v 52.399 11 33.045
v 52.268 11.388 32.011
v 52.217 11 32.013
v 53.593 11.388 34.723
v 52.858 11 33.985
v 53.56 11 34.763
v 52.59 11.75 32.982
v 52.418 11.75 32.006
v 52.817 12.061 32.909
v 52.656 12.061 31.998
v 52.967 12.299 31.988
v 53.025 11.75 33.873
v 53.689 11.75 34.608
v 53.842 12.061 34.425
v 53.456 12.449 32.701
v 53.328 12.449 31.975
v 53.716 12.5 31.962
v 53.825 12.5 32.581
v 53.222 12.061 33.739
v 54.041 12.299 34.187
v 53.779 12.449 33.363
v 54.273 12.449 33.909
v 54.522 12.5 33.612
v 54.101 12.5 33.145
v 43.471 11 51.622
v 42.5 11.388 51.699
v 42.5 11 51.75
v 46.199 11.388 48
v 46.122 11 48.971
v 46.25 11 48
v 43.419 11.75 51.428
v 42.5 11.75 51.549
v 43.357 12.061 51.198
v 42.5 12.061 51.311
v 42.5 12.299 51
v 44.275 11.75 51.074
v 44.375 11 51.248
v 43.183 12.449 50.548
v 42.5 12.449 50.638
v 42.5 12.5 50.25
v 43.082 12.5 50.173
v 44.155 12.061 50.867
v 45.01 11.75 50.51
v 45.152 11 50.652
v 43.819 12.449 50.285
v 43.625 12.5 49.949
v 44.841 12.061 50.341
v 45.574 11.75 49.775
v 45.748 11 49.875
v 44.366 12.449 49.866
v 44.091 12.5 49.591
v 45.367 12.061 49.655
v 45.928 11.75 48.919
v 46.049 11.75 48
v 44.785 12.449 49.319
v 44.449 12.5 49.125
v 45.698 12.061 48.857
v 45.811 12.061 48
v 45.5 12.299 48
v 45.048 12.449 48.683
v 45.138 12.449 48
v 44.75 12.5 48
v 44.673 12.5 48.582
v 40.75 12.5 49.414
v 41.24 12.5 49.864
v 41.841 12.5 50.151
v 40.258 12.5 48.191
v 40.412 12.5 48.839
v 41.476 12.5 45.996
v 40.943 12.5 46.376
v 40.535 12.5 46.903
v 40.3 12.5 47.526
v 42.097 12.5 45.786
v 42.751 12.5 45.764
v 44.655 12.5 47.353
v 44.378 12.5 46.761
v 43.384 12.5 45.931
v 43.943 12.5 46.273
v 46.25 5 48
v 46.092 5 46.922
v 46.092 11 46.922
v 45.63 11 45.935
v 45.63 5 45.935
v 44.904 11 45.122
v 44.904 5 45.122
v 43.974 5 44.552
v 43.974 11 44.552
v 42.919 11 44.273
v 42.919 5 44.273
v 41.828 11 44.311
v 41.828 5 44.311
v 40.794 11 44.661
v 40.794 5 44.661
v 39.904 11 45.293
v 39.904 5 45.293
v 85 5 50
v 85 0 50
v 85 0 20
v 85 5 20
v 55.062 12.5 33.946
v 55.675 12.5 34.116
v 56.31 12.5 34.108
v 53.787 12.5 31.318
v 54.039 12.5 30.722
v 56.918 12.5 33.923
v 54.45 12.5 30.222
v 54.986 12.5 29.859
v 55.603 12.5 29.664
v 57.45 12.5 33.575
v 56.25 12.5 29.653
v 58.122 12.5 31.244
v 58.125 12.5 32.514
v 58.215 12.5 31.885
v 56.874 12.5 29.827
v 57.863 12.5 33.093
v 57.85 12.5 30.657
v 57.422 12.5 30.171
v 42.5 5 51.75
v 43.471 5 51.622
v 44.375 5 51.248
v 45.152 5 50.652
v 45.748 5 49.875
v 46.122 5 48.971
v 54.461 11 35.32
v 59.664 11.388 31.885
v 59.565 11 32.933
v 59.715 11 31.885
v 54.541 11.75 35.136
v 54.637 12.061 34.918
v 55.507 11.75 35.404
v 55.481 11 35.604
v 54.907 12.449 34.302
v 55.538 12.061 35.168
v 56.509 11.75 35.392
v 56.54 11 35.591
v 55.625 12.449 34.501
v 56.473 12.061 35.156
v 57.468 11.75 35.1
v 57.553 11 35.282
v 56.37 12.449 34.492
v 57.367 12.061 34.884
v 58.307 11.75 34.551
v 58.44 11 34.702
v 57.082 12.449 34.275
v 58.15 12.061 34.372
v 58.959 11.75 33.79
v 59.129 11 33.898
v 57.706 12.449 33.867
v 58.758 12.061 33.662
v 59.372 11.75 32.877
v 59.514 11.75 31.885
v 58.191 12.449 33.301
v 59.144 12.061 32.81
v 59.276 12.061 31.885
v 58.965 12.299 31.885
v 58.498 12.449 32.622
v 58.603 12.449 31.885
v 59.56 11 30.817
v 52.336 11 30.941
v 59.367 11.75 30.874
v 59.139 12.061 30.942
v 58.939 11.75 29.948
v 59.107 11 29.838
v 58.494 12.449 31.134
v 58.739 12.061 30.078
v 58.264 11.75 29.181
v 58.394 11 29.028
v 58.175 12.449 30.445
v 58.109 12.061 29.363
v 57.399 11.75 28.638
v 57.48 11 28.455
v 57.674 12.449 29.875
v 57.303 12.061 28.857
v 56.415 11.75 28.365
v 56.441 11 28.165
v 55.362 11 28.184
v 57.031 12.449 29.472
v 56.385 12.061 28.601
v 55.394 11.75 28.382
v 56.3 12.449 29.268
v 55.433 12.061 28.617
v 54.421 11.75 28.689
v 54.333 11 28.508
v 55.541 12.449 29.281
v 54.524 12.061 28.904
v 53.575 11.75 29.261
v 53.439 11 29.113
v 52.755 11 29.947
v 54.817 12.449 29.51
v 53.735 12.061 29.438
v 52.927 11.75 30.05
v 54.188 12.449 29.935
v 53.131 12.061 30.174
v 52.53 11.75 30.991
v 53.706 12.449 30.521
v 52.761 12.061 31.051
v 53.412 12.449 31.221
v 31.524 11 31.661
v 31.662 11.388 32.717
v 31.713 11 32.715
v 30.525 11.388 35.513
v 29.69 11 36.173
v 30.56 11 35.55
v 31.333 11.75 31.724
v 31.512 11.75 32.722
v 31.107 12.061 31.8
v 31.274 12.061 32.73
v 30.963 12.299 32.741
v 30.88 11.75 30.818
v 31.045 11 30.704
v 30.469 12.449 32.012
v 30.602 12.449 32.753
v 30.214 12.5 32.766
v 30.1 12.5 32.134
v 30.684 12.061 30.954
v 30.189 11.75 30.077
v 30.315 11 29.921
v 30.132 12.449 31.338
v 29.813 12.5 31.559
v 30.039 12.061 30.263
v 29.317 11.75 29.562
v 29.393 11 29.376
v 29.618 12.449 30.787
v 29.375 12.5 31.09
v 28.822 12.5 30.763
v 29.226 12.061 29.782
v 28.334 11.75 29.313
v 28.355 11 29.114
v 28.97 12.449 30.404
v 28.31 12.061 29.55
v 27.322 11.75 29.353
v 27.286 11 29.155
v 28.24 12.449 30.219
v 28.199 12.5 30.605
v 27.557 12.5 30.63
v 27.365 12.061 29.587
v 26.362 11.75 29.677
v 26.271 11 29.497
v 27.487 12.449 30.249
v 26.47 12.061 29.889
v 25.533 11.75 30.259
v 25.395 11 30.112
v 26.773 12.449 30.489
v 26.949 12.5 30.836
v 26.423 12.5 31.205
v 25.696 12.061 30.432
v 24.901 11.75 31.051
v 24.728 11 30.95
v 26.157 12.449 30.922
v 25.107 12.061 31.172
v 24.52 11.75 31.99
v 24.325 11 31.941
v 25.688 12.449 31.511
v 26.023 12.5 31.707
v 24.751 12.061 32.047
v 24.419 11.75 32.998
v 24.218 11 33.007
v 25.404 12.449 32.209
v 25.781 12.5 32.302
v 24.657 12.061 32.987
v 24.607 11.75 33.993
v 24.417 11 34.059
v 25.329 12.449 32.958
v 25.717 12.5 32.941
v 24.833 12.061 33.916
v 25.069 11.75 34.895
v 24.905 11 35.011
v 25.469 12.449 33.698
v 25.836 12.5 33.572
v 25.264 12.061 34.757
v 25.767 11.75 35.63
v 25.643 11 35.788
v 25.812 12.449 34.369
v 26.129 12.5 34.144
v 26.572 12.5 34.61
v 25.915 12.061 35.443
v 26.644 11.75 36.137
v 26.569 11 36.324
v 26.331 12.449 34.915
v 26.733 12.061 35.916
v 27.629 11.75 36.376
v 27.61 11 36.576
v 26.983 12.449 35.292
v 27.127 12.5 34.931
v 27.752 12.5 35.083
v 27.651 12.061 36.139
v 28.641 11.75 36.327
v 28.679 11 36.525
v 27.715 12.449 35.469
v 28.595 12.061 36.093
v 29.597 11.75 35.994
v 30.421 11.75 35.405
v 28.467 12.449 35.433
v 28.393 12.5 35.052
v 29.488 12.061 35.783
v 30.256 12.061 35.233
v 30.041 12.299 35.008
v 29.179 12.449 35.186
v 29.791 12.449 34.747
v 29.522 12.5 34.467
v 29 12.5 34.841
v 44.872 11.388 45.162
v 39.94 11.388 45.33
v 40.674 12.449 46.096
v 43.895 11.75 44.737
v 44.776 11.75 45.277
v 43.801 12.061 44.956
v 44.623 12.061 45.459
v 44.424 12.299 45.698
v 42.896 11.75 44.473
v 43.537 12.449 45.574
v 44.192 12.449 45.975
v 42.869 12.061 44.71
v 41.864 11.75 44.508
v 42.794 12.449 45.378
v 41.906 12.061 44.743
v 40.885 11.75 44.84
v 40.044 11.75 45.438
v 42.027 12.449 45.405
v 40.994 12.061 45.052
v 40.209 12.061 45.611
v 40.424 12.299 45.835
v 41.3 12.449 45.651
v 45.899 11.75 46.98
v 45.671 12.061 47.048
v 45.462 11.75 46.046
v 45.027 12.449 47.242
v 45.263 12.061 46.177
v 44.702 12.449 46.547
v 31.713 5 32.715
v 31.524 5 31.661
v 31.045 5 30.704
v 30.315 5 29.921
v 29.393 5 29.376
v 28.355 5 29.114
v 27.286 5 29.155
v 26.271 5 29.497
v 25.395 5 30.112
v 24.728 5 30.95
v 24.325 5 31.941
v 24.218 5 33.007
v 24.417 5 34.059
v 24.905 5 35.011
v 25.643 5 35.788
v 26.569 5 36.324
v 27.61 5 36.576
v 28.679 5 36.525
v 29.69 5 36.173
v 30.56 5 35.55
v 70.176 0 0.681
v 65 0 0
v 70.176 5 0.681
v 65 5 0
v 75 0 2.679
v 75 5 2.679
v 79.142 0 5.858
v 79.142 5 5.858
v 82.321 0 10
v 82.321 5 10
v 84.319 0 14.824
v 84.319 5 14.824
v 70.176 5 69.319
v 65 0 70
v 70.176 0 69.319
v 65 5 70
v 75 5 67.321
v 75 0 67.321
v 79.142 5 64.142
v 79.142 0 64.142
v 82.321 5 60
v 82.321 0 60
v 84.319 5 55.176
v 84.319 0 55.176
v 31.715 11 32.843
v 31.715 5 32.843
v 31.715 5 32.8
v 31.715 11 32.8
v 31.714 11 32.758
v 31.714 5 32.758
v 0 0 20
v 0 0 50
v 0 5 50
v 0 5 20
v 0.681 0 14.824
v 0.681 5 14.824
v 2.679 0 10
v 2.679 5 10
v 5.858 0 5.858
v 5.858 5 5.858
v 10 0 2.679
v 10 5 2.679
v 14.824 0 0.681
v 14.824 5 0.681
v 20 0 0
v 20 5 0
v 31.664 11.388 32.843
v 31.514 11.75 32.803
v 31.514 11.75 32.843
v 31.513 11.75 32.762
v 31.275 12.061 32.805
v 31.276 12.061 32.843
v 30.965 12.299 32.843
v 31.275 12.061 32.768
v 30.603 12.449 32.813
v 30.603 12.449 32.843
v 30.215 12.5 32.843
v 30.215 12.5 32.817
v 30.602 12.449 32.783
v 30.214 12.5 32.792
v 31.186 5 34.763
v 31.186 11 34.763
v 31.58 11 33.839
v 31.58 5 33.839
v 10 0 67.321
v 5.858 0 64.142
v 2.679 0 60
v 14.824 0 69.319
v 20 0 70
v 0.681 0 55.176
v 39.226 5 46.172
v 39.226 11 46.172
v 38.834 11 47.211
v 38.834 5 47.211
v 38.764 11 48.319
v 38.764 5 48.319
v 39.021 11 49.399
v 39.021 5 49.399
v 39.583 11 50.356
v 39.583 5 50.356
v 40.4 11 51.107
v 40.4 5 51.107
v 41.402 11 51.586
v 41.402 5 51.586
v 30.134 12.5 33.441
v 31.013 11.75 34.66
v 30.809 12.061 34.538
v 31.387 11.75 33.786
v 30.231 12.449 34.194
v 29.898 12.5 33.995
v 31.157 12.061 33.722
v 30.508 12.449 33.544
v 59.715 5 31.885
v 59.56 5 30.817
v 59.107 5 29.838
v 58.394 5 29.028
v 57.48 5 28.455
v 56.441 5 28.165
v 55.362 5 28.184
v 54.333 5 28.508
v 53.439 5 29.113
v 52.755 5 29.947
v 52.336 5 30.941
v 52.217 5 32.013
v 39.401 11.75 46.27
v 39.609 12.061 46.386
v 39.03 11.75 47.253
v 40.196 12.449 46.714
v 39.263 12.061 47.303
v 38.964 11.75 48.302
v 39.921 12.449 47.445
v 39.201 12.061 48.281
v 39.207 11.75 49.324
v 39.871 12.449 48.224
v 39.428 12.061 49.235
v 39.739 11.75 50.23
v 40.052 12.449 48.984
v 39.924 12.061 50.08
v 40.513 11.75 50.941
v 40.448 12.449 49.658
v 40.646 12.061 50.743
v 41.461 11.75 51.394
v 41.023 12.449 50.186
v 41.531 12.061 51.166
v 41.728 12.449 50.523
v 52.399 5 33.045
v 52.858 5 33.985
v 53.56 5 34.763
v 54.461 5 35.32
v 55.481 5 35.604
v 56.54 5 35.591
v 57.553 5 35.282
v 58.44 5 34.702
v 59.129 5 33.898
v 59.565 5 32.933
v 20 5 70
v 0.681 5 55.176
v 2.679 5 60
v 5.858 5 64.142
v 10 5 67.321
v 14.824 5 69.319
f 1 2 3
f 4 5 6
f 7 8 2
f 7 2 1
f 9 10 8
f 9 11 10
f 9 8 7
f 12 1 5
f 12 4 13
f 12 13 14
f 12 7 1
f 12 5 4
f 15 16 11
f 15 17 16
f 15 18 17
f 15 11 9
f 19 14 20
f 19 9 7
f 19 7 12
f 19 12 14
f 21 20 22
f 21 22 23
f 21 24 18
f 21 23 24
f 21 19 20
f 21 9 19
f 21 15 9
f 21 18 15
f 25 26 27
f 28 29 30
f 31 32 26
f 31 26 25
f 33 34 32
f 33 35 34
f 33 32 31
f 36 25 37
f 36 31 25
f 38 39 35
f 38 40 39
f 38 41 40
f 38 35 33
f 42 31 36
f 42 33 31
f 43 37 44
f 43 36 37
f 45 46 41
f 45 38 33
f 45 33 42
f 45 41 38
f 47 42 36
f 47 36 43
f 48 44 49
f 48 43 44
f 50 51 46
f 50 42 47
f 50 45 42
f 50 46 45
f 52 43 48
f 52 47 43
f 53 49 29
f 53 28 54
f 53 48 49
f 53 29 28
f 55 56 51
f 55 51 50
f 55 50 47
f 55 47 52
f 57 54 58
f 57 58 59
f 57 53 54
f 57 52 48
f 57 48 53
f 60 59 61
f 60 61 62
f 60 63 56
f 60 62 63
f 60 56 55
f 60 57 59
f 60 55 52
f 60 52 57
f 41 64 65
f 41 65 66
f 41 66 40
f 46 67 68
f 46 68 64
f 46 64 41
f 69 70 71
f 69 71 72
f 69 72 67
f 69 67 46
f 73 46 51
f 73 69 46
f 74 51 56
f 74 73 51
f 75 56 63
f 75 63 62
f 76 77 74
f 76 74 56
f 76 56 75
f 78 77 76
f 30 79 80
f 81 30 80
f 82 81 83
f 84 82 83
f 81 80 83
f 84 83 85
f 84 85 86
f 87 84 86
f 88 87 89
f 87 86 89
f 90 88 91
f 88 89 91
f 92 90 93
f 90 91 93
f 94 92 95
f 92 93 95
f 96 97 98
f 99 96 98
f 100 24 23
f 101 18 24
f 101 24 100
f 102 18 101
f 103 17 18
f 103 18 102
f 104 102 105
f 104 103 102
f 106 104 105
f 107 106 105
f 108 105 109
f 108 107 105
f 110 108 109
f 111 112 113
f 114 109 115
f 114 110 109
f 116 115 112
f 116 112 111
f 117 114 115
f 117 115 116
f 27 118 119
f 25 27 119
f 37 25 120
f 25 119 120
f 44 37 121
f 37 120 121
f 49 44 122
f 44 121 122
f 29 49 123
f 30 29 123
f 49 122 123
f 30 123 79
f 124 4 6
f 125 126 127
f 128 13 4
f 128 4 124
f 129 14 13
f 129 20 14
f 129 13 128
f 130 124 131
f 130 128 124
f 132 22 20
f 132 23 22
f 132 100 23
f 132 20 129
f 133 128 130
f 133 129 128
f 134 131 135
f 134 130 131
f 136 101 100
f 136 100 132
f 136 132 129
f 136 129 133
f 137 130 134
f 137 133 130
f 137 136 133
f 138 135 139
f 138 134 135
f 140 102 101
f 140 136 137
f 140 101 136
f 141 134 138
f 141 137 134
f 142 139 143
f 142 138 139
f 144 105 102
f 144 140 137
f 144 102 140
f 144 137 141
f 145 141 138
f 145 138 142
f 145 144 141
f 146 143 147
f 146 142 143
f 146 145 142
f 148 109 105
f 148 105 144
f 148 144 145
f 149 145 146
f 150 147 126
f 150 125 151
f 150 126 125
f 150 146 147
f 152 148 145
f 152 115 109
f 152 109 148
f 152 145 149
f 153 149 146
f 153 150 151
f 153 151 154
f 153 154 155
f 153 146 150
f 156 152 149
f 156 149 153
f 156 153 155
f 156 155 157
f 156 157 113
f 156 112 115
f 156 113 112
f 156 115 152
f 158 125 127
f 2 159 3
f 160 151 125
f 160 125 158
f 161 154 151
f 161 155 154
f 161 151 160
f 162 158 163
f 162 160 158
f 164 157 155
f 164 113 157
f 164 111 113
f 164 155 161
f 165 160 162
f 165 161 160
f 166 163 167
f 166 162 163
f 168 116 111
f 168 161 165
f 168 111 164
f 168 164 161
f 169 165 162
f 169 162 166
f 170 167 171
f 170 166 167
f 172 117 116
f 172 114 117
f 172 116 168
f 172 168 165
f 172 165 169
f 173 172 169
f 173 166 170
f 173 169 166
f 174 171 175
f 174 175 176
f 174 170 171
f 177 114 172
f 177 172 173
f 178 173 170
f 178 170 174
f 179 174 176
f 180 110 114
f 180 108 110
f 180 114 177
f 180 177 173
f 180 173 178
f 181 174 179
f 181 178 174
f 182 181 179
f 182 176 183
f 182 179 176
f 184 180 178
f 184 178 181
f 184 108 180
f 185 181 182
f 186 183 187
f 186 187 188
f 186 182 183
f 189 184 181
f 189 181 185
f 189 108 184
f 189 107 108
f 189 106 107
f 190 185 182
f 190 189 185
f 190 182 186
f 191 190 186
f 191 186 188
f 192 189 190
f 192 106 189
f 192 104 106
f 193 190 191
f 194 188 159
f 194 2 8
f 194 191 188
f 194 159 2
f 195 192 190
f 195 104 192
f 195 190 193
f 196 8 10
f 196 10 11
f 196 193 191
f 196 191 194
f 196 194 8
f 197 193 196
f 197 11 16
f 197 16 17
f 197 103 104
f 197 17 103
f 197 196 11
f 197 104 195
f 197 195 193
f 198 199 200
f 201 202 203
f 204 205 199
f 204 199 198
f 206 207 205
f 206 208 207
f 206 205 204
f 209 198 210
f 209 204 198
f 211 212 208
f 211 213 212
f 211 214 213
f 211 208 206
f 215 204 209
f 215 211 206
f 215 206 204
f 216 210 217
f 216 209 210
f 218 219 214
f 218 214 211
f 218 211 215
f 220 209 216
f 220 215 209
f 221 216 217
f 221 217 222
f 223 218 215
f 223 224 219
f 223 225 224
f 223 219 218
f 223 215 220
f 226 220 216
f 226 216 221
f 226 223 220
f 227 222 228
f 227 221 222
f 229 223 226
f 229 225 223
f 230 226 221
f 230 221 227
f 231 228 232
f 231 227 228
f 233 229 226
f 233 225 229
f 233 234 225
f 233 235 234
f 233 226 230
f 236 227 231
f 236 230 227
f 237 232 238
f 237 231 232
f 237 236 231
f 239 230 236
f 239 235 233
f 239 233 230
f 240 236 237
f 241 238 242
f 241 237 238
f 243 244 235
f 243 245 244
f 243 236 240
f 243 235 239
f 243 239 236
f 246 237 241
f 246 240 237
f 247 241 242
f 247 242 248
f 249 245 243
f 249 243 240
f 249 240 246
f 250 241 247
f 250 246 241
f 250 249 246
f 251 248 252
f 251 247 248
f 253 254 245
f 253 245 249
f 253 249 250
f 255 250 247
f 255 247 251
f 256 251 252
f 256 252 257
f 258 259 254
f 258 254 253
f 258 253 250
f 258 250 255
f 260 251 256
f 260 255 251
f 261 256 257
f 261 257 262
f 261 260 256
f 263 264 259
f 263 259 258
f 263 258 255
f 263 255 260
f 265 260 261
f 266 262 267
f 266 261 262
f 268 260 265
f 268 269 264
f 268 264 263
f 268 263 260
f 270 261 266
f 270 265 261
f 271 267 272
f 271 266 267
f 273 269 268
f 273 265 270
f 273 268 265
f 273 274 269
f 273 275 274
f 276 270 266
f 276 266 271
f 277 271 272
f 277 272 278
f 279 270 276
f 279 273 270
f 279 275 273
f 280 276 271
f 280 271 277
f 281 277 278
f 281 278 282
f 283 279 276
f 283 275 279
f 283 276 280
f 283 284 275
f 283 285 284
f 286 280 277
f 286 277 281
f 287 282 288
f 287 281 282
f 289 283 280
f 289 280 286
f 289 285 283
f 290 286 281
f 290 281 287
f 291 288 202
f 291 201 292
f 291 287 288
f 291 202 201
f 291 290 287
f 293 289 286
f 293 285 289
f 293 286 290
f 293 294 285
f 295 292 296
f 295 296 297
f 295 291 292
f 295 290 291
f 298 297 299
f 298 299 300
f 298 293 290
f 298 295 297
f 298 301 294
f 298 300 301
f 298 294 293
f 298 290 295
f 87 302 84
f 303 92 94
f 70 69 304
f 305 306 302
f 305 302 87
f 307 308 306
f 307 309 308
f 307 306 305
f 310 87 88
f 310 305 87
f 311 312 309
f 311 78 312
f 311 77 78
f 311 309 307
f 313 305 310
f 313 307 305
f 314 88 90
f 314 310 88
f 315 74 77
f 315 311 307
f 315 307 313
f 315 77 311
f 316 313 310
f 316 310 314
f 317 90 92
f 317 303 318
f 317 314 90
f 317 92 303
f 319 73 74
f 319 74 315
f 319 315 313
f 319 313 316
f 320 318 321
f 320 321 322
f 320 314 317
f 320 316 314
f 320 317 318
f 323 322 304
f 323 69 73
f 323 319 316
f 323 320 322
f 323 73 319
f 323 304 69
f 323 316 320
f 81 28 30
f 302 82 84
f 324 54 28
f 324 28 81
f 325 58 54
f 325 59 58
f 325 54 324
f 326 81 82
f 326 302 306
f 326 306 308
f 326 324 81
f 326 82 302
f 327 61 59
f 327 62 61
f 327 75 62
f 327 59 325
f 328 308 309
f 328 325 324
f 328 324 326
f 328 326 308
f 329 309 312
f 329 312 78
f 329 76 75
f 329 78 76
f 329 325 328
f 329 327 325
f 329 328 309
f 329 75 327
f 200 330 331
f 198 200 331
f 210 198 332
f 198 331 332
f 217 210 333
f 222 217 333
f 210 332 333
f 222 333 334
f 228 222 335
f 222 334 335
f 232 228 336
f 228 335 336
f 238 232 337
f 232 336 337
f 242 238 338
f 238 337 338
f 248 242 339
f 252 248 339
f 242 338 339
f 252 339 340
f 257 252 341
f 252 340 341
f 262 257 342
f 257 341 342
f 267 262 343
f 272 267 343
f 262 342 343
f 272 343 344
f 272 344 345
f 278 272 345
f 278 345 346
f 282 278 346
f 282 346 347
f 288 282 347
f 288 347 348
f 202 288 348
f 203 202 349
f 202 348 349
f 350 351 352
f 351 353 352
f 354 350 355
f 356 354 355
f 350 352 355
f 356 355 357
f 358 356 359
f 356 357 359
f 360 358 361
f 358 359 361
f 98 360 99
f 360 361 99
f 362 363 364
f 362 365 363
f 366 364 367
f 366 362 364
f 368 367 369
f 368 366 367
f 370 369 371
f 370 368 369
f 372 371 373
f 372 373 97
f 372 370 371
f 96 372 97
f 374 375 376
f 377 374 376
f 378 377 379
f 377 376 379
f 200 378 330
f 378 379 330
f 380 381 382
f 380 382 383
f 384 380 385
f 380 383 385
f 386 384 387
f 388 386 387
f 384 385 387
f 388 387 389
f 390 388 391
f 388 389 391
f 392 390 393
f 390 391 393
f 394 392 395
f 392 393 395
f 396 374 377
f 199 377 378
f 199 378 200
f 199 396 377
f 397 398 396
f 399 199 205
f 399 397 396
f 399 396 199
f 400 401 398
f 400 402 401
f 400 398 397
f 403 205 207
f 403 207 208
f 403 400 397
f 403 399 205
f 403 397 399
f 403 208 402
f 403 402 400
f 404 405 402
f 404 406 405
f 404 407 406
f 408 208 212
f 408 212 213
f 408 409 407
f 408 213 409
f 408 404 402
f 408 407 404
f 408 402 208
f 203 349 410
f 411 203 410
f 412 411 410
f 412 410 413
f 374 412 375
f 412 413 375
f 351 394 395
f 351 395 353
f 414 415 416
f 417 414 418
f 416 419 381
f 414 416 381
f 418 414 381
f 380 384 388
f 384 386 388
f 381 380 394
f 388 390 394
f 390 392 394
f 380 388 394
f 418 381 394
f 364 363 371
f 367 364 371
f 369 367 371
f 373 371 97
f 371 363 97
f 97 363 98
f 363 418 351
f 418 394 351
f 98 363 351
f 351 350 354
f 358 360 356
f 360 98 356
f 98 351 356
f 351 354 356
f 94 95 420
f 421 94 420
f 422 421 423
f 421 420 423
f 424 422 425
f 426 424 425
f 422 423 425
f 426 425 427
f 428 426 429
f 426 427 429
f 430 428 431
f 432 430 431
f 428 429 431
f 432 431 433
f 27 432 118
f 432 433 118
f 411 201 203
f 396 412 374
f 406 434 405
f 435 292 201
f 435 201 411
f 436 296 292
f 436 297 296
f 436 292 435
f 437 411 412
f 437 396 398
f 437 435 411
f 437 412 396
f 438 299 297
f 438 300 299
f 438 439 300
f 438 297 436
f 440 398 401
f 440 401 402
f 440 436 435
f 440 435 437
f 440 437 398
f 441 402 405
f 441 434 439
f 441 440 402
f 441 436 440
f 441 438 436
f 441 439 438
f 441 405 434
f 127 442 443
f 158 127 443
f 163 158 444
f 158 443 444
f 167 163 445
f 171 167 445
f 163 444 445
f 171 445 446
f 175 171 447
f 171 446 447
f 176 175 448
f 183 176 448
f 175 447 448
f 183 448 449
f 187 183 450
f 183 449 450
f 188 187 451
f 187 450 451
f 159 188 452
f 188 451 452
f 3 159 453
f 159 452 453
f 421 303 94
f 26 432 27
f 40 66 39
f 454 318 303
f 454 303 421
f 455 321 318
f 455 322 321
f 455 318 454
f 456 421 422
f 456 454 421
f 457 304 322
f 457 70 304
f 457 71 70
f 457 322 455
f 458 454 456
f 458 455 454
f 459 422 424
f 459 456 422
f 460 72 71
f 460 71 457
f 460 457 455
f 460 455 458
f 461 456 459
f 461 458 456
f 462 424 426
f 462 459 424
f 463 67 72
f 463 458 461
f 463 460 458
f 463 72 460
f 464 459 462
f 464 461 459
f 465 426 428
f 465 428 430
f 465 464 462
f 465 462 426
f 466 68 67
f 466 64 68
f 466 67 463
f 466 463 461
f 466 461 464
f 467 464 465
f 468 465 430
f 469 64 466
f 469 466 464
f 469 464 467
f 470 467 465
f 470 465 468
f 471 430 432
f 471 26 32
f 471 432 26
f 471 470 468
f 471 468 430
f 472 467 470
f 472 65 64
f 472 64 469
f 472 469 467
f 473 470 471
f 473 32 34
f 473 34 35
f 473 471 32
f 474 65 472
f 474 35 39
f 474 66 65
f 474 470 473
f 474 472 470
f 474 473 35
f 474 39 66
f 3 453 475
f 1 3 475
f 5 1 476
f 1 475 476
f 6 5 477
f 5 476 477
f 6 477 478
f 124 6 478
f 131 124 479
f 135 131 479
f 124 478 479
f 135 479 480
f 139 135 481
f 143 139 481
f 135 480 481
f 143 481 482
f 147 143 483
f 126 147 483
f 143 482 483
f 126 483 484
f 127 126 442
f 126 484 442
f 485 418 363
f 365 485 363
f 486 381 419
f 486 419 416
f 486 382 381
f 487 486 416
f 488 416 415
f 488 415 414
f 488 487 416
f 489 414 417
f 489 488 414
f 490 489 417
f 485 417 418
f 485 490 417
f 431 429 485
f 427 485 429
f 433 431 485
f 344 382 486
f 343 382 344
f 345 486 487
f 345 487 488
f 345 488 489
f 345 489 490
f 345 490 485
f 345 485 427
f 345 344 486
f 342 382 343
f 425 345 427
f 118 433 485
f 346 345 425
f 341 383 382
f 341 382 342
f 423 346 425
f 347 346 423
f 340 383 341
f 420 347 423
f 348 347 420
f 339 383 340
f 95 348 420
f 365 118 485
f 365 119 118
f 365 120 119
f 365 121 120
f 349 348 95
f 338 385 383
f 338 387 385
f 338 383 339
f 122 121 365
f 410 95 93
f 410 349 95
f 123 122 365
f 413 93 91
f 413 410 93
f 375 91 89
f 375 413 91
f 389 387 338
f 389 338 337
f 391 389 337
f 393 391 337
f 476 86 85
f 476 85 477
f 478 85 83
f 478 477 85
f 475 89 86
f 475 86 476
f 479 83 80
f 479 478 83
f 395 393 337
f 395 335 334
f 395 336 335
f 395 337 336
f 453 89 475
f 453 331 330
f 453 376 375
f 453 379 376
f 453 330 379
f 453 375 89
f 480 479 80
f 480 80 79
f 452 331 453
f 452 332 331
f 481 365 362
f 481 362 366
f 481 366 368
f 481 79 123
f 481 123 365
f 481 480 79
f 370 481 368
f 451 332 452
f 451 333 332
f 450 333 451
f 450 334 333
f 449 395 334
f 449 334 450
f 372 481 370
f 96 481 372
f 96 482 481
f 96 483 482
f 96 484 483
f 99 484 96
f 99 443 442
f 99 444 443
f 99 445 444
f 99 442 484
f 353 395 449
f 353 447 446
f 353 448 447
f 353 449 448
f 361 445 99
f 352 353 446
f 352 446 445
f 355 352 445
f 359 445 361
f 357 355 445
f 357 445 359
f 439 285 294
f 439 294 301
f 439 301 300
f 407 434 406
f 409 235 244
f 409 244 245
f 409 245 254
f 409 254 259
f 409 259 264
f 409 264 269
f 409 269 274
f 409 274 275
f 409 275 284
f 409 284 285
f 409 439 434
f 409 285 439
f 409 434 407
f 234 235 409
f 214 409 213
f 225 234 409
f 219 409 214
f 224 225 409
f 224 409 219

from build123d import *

# Parameters (mm, degrees)
SKETCH1_W           = 85
SKETCH1_H           = 70
BOSS_EXTRUDE1_DEPTH = 5
BOSS_EXTRUDE2_DEPTH = 7.5
FILLET1_R           = 1.5
FILLET2_R           = 20


with BuildPart() as part:
    # Sketch1 → Boss-Extrude1 (new body)
    with BuildSketch(Plane(origin=(0, 0, 0), x_dir=(1, 0, 0), z_dir=(0, 1, 0))):
        with Locations((42.5, -35)):
            Rectangle(SKETCH1_W, SKETCH1_H)
    extrude(amount=BOSS_EXTRUDE1_DEPTH)

    # Sketch2 → Boss-Extrude2 (add)
    with BuildSketch(Plane(origin=(0, 5, 0), x_dir=(1, 0, 0), z_dir=(0, 1, 0))):
        with BuildLine():
            ThreePointArc((31.712705589, -32.714866344), (24.490905169, -31.43108309), (30.560453247, -35.549709909))
            Line((30.560453247, -35.549709909), (27.964899606, -32.843125107))
            Line((27.964899606, -32.843125107), (31.712705589, -32.714866344))
        make_face()
        with BuildLine():
            Line((27.964899606, -32.843125107), (30.560453247, -35.549709909))
            ThreePointArc((30.560453247, -35.549709909), (31.41423477, -34.314378627), (31.714899606, -32.843125107))
            ThreePointArc((31.714899606, -32.843125107), (31.714351061, -32.778986344), (31.712705589, -32.714866344))
            Line((31.712705589, -32.714866344), (27.964899606, -32.843125107))
        make_face()
        with BuildLine():
            ThreePointArc((52.217093622, -32.013157813), (52.595566686, -33.531135874), (53.560453247, -34.762595649))
            Line((53.560453247, -34.762595649), (55.964899606, -31.884899051))
            Line((55.964899606, -31.884899051), (52.217093622, -32.013157813))
        make_face()
        with BuildLine():
            Line((55.964899606, -31.884899051), (53.560453247, -34.762595649))
            ThreePointArc((53.560453247, -34.762595649), (57.553267661, -35.281895801), (59.714899606, -31.884899051))
            ThreePointArc((59.714899606, -31.884899051), (55.900760842, -28.135447595), (52.217093622, -32.013157813))
            Line((52.217093622, -32.013157813), (55.964899606, -31.884899051))
        make_face()
        with BuildLine():
            Line((42.5, -48), (42.5, -51.75))
            ThreePointArc((42.5, -51.75), (45.151650429, -50.651650429), (46.25, -48))
            ThreePointArc((46.25, -48), (45.89699675, -46.411631945), (44.904446358, -45.122303402))
            Line((44.904446358, -45.122303402), (42.5, -48))
        make_face()
        with BuildLine():
            ThreePointArc((39.904446358, -45.293415198), (39.020618373, -49.398714944), (42.5, -51.75))
            Line((42.5, -51.75), (42.5, -48))
            Line((42.5, -48), (39.904446358, -45.293415198))
        make_face()
        with BuildLine():
            Line((39.904446358, -45.293415198), (42.5, -48))
            Line((42.5, -48), (44.904446358, -45.122303402))
            ThreePointArc((44.904446358, -45.122303402), (42.371741238, -44.252194017), (39.904446358, -45.293415198))
        make_face()
    extrude(amount=BOSS_EXTRUDE2_DEPTH)

    # Fillet1
    fillet1_edges = [part.edges().sort_by_distance(p)[0] for p in [
        (25.369345964, 12.5, 30.136540305),
        (59.712705589, 12.5, 31.756640288),
        (45.095553642, 12.5, 50.706584802),
    ]]
    fillet(fillet1_edges, radius=FILLET1_R)

    # Fillet2
    fillet2_edges = [part.edges().sort_by_distance(p)[0] for p in [
        (0, 2.5, 0),
        (85, 2.5, 0),
        (85, 2.5, 70),
        (0, 2.5, 70),
    ]]
    fillet(fillet2_edges, radius=FILLET2_R)


solid = part.part
